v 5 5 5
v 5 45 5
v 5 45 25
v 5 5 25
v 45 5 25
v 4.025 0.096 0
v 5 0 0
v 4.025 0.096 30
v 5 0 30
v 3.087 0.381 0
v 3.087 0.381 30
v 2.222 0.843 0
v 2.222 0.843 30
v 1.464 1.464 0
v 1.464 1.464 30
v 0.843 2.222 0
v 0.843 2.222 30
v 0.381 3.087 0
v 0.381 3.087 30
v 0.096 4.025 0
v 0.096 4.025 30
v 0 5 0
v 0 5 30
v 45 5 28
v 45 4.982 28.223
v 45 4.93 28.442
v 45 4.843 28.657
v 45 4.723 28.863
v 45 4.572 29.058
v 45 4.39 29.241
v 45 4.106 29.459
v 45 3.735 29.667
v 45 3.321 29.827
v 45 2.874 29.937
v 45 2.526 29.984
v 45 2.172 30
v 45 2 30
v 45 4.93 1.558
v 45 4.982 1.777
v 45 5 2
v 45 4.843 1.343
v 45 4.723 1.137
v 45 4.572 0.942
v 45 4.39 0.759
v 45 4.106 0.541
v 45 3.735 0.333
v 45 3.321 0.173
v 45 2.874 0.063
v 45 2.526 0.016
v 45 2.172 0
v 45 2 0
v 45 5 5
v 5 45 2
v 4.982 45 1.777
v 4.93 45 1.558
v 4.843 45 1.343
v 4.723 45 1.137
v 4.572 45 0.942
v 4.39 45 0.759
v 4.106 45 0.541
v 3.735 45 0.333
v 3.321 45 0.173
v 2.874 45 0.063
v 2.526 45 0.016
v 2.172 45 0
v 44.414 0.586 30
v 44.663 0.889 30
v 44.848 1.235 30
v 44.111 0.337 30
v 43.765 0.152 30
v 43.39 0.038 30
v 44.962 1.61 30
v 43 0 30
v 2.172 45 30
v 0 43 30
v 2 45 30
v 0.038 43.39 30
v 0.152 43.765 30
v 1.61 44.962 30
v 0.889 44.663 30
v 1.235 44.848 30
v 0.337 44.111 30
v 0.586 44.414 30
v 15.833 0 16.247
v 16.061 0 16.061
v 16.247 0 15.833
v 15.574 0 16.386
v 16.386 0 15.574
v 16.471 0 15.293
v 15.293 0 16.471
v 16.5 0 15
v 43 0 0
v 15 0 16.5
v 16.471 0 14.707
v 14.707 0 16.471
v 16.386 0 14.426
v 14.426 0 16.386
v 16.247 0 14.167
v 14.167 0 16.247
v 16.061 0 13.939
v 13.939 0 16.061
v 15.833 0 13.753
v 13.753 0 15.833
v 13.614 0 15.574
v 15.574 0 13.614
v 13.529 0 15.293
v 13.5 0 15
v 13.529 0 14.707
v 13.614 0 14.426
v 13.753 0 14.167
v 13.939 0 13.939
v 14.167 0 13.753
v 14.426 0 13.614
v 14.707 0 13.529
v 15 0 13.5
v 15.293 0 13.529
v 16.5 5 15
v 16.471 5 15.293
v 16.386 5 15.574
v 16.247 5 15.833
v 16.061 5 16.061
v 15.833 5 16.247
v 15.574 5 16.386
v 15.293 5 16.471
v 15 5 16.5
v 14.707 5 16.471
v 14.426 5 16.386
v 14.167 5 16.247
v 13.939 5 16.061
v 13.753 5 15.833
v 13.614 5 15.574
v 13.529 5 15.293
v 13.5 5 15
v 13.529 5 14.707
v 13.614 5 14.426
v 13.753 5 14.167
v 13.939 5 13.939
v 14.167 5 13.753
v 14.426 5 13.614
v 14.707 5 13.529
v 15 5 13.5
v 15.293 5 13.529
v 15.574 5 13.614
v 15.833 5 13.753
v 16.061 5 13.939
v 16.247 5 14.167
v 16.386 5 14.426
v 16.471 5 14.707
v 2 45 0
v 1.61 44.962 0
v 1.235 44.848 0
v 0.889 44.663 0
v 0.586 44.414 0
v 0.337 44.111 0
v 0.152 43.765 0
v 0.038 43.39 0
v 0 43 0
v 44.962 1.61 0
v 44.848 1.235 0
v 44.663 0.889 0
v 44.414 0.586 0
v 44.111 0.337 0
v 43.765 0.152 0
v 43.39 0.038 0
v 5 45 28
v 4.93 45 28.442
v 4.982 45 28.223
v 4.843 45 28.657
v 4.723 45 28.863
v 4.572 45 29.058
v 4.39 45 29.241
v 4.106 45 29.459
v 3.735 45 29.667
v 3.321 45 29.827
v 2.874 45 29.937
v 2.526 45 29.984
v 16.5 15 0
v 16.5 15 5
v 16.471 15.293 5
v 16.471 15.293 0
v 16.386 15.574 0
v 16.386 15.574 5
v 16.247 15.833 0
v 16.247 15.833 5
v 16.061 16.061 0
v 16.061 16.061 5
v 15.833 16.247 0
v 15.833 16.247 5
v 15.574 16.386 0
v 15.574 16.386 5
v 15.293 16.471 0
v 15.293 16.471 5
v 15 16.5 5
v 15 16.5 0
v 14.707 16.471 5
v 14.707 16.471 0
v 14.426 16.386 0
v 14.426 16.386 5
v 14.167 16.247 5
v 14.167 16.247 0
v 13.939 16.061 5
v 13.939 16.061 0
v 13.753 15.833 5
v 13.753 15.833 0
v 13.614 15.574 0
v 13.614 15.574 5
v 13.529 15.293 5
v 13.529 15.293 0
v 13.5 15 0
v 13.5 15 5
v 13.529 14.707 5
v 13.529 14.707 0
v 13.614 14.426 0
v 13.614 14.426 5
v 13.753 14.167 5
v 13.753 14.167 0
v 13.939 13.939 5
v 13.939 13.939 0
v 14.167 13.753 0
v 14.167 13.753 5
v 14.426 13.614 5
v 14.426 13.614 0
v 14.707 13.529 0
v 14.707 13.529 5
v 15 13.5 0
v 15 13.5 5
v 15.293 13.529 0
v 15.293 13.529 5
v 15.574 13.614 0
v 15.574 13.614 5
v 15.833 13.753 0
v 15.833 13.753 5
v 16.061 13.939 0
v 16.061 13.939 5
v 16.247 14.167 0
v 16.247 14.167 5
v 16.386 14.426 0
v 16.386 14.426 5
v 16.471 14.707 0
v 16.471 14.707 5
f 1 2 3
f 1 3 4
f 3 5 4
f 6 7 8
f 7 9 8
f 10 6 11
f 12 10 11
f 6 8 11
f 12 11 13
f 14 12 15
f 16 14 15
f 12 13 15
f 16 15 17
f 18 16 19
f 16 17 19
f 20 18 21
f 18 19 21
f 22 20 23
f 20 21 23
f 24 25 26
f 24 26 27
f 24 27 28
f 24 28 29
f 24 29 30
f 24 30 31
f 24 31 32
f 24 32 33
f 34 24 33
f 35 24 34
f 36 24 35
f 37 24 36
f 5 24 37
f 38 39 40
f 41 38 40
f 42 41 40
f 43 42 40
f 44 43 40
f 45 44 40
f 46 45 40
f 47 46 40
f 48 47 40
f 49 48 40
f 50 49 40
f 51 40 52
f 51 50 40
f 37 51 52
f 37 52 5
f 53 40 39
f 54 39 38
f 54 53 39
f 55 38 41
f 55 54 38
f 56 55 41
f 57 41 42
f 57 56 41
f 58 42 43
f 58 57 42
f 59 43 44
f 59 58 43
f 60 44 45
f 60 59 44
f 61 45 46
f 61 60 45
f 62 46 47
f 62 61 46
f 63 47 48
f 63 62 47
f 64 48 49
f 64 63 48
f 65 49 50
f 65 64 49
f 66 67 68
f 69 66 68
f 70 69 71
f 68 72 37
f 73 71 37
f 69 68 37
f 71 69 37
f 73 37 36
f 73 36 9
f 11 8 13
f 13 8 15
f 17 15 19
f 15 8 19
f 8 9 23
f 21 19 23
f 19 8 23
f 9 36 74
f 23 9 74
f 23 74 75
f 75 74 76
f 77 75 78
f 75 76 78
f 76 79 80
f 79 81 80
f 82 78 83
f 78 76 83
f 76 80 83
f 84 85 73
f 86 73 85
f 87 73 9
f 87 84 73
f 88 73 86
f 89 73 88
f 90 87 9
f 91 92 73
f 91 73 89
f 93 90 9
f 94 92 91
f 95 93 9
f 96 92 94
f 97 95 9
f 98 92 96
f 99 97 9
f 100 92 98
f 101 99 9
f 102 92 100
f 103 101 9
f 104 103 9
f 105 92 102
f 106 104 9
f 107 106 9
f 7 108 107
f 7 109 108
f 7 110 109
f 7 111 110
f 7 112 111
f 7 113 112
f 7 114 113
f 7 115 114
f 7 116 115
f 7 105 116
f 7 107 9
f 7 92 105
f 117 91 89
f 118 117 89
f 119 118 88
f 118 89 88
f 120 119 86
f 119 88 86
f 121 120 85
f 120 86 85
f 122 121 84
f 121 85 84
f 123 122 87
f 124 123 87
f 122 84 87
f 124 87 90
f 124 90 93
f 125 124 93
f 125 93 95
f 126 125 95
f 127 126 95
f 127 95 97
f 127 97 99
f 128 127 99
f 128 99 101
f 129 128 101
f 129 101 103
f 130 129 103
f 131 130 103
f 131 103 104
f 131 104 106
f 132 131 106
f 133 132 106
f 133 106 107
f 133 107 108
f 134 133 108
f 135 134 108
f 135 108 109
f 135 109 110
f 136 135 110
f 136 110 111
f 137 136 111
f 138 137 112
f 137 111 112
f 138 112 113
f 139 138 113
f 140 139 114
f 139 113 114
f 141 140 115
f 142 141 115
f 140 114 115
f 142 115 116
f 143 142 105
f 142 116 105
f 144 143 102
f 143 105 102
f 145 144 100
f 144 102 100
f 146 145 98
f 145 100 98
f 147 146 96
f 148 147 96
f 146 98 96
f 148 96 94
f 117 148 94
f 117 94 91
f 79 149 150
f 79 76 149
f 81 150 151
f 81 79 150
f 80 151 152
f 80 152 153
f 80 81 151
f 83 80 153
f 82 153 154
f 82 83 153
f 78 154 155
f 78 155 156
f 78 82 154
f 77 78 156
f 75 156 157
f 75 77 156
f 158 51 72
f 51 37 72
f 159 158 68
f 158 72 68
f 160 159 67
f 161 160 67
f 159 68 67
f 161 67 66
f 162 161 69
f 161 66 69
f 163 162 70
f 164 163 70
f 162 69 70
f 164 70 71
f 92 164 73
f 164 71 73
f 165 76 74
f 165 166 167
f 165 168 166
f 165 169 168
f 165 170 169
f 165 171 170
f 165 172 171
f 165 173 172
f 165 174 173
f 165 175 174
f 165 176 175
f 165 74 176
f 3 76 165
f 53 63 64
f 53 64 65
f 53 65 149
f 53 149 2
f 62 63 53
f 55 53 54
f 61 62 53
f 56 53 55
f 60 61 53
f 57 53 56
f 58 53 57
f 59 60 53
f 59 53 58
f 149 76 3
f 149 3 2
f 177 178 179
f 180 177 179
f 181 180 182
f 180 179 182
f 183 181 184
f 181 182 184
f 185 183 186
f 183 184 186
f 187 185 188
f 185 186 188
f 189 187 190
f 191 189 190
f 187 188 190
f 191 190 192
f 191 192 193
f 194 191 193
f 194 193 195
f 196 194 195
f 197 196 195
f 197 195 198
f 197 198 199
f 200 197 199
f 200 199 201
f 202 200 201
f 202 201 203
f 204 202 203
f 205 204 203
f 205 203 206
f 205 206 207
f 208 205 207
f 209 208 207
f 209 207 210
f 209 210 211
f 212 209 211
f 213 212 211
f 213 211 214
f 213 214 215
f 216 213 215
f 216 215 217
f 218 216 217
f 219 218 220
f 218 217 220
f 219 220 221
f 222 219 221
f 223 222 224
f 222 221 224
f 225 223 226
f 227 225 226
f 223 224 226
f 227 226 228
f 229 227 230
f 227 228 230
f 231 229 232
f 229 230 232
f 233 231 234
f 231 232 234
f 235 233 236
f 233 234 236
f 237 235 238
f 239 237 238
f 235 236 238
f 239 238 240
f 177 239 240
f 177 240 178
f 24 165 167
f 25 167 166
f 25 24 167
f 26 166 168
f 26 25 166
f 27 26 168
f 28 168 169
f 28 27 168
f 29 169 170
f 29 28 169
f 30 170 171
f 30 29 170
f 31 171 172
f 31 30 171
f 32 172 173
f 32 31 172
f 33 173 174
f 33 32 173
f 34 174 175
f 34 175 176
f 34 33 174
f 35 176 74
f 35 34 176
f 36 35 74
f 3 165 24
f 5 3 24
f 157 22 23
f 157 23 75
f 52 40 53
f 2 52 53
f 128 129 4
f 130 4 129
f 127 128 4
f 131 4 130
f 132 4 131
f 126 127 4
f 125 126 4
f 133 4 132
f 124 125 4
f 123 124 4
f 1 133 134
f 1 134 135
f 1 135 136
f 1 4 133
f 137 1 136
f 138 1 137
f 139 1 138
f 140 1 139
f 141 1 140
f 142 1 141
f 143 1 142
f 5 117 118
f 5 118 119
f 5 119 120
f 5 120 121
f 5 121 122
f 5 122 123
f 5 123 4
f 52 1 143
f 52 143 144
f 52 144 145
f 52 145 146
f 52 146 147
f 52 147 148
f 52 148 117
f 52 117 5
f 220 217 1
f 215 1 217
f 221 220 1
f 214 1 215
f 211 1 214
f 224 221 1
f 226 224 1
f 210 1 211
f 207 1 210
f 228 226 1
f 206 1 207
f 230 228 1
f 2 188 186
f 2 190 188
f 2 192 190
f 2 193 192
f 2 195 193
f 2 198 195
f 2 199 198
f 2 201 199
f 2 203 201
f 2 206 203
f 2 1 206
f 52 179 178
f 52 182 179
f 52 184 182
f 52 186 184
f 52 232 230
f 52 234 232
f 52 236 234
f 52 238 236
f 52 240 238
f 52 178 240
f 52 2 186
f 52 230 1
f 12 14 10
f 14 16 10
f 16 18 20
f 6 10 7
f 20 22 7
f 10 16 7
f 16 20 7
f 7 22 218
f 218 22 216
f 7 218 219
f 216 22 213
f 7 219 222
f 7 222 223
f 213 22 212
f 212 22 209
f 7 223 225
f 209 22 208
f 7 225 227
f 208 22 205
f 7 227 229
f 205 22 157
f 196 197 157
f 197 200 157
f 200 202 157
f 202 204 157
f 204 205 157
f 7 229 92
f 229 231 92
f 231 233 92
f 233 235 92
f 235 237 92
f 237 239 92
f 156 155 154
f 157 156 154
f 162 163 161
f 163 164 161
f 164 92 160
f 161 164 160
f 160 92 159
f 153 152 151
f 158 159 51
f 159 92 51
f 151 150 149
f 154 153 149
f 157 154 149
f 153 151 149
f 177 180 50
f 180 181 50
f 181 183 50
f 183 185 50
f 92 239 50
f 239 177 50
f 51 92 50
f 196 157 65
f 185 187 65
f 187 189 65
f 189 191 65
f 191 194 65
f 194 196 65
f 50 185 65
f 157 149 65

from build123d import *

# Parameters (mm, degrees)
BOSS_EXTRUDE2_DEPTH = 30
BOSS_EXTRUDE3_DEPTH = 5
BOSS_EXTRUDE4_DEPTH = 5
SKETCH4_R           = 1.5
CUT_EXTRUDE1_DEPTH  = 46
SKETCH5_R           = 1.5
CUT_EXTRUDE2_DEPTH  = 6
FILLET1_R           = 2
FILLET2_R           = 5


with BuildPart() as part:
    # Sketch1 → Boss-Extrude2 (new body)
    with BuildSketch(Plane.XY):
        Polygon((0, 0), (0, 45), (5, 45), (5, 5), (45, 5), (45, 0), align=None)
    extrude(amount=BOSS_EXTRUDE2_DEPTH)

    # Sketch2 → Boss-Extrude3 (add)
    with BuildSketch(Plane.XY.offset(30)):
        Polygon((5, 45), (45, 5), (5, 5), align=None)
    extrude(amount=-BOSS_EXTRUDE3_DEPTH)

    # Sketch3 → Boss-Extrude4 (add)
    with BuildSketch(Plane(origin=(0, 0, 0), x_dir=(-1, 0, 0), z_dir=(0, 0, -1))):
        Polygon((-5, 45), (-5, 5), (-45, 5), align=None)
    extrude(amount=-BOSS_EXTRUDE4_DEPTH)

    # Sketch4 → Cut-Extrude1 (cut, through all)
    with BuildSketch(Plane.XZ):
        with Locations((15, 15)):
            Circle(SKETCH4_R)
    extrude(amount=-CUT_EXTRUDE1_DEPTH, mode=Mode.SUBTRACT)

    # Sketch5 → Cut-Extrude2 (cut, through all)
    with BuildSketch(Plane.XY.offset(5)):
        with Locations((15, 15)):
            Circle(SKETCH5_R)
    extrude(amount=-CUT_EXTRUDE2_DEPTH, mode=Mode.SUBTRACT)

    # Fillet1
    fillet1_edges = [part.edges().sort_by_distance(p)[0] for p in [
        (0, 45, 15),
        (45, 0, 15),
        (25, 25, 30),
        (25, 25, 0),
    ]]
    fillet(fillet1_edges, radius=FILLET1_R)

    # Fillet2
    fillet2_edges = [part.edges().sort_by_distance(p)[0] for p in [
        (0, 0, 15),
    ]]
    fillet(fillet2_edges, radius=FILLET2_R)


solid = part.part
